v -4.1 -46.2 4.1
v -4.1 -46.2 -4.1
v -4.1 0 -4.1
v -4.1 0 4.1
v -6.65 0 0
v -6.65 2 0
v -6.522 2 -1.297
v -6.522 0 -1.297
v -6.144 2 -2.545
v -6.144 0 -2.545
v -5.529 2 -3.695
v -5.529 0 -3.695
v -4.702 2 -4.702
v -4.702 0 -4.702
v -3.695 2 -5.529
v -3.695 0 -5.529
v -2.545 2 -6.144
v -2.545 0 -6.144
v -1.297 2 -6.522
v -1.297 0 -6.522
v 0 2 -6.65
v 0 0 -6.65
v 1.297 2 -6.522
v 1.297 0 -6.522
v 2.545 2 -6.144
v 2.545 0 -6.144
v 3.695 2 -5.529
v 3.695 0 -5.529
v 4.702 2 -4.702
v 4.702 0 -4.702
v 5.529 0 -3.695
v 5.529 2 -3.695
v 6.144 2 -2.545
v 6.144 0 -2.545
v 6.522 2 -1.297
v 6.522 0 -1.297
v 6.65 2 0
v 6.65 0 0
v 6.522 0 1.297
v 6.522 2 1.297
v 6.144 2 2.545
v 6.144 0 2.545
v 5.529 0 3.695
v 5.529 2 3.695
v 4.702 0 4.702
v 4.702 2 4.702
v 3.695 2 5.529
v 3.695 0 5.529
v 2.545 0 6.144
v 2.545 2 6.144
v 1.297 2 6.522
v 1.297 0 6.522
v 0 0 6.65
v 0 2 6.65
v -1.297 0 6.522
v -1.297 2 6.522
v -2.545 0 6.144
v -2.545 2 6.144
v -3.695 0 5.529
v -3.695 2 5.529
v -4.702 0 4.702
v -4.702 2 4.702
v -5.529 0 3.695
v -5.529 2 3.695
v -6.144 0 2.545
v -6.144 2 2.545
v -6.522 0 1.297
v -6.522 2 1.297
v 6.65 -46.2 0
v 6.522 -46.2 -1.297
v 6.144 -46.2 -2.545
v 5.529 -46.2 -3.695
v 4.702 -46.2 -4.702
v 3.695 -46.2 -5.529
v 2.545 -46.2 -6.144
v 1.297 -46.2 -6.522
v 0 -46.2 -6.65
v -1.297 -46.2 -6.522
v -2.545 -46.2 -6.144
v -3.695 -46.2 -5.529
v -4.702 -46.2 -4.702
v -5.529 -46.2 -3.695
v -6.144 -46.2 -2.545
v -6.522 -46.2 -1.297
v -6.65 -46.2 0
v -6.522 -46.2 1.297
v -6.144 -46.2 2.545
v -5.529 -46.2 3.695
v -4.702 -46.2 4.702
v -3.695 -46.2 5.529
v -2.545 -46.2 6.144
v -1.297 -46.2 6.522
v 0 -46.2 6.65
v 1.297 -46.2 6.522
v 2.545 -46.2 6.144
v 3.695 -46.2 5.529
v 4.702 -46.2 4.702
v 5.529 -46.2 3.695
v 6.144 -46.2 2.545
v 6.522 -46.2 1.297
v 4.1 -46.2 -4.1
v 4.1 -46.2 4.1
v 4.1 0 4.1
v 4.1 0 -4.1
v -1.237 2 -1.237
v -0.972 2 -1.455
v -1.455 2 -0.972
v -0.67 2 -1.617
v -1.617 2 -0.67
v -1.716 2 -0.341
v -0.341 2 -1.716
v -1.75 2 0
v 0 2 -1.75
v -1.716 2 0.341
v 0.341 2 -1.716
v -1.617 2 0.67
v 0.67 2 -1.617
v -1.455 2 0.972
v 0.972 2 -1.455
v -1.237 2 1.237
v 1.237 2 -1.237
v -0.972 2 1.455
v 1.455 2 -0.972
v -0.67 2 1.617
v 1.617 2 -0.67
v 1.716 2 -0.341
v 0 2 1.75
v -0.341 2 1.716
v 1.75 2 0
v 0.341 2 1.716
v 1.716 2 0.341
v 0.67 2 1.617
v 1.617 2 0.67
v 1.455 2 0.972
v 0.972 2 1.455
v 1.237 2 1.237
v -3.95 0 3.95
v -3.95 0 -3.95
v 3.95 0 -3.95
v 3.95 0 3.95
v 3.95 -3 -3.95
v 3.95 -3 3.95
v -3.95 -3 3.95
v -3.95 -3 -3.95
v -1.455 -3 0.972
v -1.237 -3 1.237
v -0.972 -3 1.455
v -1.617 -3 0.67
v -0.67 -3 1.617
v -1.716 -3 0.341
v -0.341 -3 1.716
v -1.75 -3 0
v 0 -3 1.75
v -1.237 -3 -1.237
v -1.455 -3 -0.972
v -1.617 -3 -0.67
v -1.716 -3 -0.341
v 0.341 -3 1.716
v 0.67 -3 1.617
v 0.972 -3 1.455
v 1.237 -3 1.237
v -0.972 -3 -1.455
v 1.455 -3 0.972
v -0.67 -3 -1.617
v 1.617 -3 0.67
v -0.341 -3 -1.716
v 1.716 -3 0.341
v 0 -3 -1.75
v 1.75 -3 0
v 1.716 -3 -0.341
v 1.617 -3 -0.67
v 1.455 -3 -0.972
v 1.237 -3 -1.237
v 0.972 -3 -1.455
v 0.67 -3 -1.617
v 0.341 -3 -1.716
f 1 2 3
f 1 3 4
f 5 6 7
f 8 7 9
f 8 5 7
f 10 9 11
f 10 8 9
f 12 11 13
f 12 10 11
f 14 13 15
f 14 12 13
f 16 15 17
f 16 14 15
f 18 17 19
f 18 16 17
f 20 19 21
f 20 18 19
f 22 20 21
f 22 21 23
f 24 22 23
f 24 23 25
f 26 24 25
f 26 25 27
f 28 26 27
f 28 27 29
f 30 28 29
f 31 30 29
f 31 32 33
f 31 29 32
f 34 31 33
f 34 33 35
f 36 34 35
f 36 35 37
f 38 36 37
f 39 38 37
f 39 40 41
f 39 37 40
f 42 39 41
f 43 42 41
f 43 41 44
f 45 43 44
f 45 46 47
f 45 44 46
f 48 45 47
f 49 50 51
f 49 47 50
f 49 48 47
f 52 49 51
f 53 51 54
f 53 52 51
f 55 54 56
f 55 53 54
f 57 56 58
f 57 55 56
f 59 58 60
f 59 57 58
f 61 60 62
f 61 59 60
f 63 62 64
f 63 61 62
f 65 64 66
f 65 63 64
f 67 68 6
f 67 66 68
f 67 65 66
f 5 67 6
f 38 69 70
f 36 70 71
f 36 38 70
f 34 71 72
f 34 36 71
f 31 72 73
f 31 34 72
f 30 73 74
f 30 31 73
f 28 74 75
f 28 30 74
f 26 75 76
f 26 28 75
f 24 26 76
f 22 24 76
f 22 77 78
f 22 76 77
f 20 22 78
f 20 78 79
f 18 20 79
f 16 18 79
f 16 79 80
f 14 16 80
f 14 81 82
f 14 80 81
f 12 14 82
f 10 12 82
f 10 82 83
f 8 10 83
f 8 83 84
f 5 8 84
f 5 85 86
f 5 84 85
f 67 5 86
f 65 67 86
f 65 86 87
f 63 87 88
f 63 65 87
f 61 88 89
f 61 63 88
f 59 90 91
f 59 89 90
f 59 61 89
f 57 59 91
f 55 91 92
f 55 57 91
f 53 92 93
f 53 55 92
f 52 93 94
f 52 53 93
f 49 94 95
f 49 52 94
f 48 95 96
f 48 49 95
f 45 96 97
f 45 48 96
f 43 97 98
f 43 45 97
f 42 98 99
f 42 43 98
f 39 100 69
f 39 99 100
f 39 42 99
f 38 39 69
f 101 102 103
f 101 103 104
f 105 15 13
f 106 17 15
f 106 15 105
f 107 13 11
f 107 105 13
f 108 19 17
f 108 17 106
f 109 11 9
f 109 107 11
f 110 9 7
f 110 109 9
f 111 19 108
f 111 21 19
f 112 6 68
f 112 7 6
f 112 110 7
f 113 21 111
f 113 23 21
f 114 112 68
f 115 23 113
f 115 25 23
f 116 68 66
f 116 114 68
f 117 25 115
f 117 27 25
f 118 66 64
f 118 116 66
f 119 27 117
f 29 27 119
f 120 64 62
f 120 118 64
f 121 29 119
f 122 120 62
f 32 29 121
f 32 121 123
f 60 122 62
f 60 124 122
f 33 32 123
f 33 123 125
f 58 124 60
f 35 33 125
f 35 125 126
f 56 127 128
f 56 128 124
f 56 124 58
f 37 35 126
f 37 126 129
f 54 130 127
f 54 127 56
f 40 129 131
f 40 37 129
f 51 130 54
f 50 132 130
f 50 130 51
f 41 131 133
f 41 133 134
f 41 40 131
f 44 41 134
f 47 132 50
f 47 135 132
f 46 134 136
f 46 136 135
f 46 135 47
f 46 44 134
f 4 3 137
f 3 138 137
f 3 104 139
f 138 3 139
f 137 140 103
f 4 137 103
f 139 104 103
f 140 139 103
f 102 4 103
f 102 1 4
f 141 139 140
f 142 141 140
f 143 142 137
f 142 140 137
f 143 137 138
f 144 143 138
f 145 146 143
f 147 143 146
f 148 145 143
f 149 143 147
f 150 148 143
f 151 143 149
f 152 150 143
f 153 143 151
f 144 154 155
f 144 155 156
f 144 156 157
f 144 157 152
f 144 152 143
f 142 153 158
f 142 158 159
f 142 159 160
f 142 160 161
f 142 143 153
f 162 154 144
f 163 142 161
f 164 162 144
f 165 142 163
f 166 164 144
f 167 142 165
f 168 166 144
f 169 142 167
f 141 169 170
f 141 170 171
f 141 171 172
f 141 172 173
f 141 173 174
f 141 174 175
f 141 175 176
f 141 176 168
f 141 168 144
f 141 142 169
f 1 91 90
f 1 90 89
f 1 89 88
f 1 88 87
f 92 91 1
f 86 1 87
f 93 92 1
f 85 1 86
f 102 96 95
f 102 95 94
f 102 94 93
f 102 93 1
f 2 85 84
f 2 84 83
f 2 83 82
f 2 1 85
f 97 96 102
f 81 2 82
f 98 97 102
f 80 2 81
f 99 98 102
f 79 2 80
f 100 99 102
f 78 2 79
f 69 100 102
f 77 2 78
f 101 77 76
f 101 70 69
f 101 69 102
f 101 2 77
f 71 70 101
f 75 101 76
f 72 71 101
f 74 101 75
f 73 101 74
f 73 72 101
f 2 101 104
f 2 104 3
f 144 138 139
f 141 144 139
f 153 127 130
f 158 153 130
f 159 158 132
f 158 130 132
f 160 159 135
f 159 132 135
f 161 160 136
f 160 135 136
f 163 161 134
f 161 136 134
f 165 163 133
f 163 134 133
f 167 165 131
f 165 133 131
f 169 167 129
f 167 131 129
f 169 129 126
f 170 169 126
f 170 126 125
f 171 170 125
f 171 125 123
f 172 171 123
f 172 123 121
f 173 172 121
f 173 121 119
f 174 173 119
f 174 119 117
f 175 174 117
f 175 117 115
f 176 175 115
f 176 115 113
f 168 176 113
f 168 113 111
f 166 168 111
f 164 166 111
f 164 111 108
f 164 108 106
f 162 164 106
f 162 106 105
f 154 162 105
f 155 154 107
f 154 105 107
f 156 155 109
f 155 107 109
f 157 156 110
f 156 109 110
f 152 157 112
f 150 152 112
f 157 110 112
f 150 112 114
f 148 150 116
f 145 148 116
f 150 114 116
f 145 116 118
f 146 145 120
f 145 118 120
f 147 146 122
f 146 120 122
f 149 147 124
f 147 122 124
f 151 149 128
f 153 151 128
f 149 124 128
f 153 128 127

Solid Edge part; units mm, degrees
sketch "Sketch1" plane through (0, 0, 0) normal (0, -1, 0) x (1, 0, 0)
  circle A0 centre (0, 0) radius 6.65
extrude "Protrusion1" add sketch "Sketch1" along normal blind 46.2
sketch "Sketch2" plane through (0, -46.2, 0) normal (0, -1, 0) x (1, 0, 0)
  line L0 (-4.1, 4.1) -> (4.1, 4.1)
  line L1 (4.1, 4.1) -> (4.1, -4.1)
  line L2 (4.1, -4.1) -> (-4.1, -4.1)
  line L3 (-4.1, -4.1) -> (-4.1, 4.1)
  dimension "D1" = 8.2
extrude "Cutout1" cut sketch "Sketch2" against normal through all
sketch "Sketch3" plane through (0, 0, 0) normal (0, 1, 0) x (-1, 0, 0)
  line L0 (-3.95, -3.95) -> (-3.95, 3.95)
  line L1 (-3.95, 3.95) -> (3.95, 3.95)
  line L2 (3.95, 3.95) -> (3.95, -3.95)
  line L3 (3.95, -3.95) -> (-3.95, -3.95)
extrude "Protrusion2" add sketch "Sketch3" against normal blind 3
sketch "Sketch4" plane through (0, 0, 0) normal (0, 1, 0) x (-1, 0, 0)
  circle A0 centre (0, 0) radius 6.65
extrude "Extrusionsausprägung_5" add sketch "Sketch4" along normal blind 2
hole "Bohrung_5" at (0, 2, 0) direction (0, -1, 0) diameter 3.5 end up to next
